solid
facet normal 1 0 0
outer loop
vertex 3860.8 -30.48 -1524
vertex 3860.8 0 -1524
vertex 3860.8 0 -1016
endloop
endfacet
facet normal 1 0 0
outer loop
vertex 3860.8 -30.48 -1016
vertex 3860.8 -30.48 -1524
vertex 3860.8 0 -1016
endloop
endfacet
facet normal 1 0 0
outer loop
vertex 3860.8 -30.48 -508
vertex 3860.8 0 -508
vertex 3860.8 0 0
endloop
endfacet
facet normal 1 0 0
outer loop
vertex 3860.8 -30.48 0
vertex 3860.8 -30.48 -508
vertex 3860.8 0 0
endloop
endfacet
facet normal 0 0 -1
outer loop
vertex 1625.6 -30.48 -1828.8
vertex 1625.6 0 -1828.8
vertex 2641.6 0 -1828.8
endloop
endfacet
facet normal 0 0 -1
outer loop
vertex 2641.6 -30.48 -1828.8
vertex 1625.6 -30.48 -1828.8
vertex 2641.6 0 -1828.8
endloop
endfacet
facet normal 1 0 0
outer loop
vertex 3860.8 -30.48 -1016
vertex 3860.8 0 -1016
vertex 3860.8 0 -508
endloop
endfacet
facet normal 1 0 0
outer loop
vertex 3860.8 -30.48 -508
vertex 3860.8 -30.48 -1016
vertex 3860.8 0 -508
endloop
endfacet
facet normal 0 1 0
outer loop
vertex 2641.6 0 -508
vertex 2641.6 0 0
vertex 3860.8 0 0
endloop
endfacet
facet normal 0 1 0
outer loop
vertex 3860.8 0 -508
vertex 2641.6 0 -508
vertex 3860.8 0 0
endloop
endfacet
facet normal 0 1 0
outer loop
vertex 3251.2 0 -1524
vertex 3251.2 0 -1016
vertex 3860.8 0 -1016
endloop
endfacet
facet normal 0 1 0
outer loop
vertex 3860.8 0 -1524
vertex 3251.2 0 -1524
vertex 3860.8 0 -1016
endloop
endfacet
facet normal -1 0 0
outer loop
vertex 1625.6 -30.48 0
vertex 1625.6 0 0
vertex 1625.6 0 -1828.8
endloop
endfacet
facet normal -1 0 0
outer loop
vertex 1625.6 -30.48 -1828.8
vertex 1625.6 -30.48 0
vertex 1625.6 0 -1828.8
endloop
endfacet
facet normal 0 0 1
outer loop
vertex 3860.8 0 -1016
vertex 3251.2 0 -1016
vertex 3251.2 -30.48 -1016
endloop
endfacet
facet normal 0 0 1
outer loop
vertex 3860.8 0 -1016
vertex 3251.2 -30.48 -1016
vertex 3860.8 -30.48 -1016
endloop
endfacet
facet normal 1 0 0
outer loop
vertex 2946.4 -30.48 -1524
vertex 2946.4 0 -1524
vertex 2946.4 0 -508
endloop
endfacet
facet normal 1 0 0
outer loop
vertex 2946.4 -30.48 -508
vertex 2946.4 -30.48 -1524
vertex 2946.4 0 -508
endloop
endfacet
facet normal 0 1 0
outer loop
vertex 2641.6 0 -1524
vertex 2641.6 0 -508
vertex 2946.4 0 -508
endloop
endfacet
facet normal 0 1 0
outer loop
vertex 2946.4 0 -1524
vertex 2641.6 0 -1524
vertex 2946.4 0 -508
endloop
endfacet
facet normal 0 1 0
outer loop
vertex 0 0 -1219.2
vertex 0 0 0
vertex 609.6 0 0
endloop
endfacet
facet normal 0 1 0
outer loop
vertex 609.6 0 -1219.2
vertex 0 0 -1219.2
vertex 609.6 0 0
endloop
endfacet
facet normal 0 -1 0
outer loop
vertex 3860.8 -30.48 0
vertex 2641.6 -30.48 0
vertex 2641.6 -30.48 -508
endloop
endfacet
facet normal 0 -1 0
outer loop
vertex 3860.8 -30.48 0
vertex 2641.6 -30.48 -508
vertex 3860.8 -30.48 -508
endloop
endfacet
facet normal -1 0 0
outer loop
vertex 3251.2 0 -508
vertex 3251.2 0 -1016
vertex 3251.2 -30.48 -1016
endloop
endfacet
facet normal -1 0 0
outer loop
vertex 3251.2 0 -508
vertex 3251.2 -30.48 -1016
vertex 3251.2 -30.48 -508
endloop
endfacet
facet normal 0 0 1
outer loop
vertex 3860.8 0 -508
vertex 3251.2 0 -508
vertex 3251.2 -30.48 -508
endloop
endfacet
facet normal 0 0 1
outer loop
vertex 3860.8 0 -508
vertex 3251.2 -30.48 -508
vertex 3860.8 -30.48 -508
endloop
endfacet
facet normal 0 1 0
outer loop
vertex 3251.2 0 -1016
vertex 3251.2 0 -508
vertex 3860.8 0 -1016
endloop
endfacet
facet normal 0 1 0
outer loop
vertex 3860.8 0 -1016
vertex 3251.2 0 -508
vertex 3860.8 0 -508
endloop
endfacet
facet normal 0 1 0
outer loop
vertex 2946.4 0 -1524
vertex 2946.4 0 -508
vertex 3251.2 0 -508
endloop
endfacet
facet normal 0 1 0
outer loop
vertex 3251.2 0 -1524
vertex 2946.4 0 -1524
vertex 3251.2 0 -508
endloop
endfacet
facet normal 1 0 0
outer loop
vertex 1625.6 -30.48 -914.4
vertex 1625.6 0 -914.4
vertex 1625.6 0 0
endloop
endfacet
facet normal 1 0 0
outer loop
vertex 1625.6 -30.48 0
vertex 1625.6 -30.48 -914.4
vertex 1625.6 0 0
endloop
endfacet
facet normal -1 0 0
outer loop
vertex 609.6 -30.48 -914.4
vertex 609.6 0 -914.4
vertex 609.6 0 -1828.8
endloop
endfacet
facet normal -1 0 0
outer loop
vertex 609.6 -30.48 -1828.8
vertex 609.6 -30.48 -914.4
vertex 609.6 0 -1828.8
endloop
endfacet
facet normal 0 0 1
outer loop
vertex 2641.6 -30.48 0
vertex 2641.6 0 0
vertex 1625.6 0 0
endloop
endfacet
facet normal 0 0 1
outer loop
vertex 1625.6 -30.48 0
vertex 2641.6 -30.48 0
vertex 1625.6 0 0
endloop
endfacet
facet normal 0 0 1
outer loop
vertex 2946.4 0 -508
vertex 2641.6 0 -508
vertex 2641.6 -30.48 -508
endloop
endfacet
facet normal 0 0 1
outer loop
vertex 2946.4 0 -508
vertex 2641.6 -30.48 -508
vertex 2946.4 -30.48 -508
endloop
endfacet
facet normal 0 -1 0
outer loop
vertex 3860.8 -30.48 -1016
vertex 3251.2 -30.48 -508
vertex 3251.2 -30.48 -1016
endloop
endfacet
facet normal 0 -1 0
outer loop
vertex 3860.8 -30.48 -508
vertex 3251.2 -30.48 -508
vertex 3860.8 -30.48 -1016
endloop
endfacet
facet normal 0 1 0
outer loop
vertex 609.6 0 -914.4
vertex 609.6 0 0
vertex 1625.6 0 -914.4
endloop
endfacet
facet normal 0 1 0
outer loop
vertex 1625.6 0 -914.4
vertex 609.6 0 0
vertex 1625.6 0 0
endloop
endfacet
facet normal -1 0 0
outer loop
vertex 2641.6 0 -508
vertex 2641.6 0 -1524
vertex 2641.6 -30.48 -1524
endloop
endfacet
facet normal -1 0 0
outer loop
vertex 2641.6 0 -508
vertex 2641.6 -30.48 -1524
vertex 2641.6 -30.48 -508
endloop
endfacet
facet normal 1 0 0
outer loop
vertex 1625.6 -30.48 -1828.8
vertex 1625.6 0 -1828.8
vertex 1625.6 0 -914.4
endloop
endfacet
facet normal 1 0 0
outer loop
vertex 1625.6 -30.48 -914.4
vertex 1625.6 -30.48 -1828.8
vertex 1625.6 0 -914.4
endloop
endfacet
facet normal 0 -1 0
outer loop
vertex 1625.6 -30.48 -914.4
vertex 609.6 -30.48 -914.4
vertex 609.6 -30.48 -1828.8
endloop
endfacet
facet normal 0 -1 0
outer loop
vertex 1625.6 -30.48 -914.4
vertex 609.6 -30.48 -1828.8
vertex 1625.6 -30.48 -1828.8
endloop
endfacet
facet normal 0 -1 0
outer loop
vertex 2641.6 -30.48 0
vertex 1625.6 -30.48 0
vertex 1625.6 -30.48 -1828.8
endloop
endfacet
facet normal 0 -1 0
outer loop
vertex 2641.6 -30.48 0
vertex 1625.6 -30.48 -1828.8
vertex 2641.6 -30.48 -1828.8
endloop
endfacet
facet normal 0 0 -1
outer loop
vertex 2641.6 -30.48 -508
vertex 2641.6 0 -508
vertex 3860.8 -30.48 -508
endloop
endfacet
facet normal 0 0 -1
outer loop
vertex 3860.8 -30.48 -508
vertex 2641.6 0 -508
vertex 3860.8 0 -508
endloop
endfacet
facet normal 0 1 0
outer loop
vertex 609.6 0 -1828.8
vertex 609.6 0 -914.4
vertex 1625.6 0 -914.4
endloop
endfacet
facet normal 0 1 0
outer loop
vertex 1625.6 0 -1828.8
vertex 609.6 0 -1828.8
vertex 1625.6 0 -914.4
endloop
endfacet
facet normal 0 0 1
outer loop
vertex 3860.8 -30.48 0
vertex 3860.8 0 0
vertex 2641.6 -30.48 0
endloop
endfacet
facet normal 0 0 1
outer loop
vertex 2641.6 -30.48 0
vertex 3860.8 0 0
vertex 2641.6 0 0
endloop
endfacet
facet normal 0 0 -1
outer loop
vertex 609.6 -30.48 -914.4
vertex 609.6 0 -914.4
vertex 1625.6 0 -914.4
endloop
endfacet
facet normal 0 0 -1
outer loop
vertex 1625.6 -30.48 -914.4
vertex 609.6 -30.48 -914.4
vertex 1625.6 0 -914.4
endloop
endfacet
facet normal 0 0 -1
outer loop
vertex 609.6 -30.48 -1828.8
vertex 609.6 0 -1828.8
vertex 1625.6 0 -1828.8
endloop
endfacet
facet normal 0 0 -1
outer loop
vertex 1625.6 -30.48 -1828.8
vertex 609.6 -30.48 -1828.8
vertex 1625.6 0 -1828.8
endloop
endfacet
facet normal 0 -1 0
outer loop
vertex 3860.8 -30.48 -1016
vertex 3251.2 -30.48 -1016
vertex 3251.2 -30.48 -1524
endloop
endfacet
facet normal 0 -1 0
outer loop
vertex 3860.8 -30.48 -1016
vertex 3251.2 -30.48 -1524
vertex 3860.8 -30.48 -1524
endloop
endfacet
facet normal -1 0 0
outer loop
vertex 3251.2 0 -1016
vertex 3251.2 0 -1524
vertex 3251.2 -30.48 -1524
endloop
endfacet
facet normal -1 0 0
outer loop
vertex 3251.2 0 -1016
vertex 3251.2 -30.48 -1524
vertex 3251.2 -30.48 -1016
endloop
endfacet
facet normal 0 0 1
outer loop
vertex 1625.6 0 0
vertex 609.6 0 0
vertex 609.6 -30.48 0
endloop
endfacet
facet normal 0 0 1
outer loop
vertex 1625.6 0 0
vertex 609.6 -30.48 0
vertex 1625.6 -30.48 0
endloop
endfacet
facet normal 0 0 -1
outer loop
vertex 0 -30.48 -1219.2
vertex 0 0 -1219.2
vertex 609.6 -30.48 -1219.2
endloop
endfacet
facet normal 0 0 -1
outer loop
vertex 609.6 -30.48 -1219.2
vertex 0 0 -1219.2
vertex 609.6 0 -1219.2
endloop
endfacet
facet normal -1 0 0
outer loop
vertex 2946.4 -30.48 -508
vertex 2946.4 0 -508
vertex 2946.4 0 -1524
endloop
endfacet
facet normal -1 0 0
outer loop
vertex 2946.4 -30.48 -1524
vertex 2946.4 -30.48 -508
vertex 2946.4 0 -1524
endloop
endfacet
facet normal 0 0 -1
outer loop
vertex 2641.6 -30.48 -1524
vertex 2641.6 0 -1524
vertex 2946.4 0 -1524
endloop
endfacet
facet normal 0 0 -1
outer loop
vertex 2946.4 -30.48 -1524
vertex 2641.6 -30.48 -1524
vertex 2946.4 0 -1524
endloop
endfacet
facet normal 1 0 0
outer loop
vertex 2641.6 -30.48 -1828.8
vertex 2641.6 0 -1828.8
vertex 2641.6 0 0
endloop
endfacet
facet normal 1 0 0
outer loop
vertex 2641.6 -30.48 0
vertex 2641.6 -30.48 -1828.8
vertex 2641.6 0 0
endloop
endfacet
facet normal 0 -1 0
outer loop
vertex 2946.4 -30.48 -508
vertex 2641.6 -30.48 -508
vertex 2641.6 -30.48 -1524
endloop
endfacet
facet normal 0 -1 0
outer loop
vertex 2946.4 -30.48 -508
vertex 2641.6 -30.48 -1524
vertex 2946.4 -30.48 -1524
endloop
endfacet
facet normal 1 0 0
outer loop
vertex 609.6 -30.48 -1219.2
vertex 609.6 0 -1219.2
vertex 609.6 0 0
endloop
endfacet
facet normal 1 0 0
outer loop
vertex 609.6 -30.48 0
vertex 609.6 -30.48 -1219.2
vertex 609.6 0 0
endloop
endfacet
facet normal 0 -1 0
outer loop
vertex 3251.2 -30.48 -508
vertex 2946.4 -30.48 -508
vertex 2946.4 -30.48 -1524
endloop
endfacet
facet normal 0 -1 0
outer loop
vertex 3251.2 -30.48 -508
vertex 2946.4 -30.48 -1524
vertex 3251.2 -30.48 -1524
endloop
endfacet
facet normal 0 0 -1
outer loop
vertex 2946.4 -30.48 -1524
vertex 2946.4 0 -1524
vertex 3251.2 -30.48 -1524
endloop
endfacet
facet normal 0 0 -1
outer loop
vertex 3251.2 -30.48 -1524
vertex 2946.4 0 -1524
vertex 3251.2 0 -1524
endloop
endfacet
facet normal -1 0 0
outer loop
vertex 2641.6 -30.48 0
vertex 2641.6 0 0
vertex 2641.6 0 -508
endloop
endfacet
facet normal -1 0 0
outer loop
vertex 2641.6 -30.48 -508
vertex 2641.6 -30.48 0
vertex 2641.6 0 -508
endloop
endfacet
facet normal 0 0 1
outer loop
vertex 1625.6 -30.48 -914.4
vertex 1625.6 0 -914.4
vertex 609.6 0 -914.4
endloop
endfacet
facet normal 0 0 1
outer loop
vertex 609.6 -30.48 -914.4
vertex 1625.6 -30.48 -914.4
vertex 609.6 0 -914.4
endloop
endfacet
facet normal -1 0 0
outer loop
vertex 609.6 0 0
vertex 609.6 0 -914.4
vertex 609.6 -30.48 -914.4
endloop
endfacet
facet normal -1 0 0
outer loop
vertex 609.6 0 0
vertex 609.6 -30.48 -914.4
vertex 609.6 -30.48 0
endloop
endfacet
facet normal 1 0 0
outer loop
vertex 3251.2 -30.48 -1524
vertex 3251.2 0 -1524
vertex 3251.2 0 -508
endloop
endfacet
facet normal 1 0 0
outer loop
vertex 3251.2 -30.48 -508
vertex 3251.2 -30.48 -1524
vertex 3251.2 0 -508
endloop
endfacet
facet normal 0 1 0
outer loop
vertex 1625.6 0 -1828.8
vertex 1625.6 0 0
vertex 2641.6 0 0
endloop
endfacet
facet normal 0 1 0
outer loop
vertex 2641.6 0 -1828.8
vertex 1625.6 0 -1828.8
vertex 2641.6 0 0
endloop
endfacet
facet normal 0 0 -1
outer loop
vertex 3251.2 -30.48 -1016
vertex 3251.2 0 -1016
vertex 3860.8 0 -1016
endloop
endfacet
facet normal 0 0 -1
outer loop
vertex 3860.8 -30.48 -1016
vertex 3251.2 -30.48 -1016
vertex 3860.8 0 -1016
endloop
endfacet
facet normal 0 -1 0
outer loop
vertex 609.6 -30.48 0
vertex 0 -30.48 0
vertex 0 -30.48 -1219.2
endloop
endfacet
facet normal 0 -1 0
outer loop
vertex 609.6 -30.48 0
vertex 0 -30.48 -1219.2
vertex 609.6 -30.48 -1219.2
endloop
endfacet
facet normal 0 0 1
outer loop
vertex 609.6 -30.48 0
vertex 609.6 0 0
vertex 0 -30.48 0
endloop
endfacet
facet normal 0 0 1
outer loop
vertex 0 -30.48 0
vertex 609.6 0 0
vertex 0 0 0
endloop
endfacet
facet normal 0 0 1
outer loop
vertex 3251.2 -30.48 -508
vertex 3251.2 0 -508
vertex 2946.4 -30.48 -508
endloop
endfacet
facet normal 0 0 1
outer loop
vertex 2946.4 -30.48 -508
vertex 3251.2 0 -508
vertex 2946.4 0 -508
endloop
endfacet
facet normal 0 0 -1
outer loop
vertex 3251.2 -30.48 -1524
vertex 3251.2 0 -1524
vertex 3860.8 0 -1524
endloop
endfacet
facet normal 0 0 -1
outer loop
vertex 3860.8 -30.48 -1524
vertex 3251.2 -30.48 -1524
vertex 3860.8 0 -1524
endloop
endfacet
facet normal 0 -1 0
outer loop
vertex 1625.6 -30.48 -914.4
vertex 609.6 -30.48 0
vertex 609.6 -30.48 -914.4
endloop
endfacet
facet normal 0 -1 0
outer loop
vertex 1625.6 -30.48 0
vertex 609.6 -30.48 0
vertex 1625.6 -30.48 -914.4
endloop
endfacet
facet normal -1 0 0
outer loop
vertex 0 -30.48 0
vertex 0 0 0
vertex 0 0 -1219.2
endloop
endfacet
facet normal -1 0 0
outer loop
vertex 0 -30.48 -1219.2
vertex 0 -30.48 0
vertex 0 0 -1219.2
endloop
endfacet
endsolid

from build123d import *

# Parameters (mm, degrees)
F1_DEPTH = 30.48
F0_W     = 1016
F0_H     = 914.4
F0_W_2   = 609.6
F0_H_2   = 508
F2_DEPTH = 30.48
F0_W_3   = 304.8
F0_H_3   = 1016
F3_DEPTH = 30.48


with BuildPart() as f1:
    # F0 (on Front) → F1 (new body)
    with BuildSketch(Plane.XZ):
        Polygon((609.6, 0), (0, 0), (0, -1219.2), (609.6, -1219.2), (609.6, -914.4), align=None)
        Polygon((2641.6, 0), (1625.6, 0), (1625.6, -914.4), (1625.6, -1828.8), (2641.6, -1828.8), (2641.6, -1524), (2641.6, -508), align=None)
        Polygon((3251.2, -508), (2946.4, -508), (2946.4, -1524), (3251.2, -1524), (3251.2, -1016), align=None)
    extrude(amount=F1_DEPTH)


with BuildPart() as f2:
    # F0 (on Front) → F2 (new body)
    with BuildSketch(Plane.XZ):
        with Locations((1117.6, -457.2)):
            Rectangle(F0_W, F0_H)
        Polygon((3860.8, 0), (2641.6, 0), (2641.6, -508), (2946.4, -508), (3251.2, -508), (3860.8, -508), align=None)
        with Locations((3556, -1270)):
            Rectangle(F0_W_2, F0_H_2)
    extrude(amount=F2_DEPTH)


with BuildPart() as f3:
    # F0 (on Front) → F3 (new body)
    with BuildSketch(Plane.XZ):
        Polygon((1625.6, -914.4), (609.6, -914.4), (609.6, -1219.2), (609.6, -1828.8), (1625.6, -1828.8), align=None)
        with Locations((2794, -1016)):
            Rectangle(F0_W_3, F0_H_3)
        with Locations((3556, -762)):
            Rectangle(F0_W_2, F0_H_2)
    extrude(amount=F3_DEPTH)


solid = Compound([f1.part, f2.part, f3.part])
